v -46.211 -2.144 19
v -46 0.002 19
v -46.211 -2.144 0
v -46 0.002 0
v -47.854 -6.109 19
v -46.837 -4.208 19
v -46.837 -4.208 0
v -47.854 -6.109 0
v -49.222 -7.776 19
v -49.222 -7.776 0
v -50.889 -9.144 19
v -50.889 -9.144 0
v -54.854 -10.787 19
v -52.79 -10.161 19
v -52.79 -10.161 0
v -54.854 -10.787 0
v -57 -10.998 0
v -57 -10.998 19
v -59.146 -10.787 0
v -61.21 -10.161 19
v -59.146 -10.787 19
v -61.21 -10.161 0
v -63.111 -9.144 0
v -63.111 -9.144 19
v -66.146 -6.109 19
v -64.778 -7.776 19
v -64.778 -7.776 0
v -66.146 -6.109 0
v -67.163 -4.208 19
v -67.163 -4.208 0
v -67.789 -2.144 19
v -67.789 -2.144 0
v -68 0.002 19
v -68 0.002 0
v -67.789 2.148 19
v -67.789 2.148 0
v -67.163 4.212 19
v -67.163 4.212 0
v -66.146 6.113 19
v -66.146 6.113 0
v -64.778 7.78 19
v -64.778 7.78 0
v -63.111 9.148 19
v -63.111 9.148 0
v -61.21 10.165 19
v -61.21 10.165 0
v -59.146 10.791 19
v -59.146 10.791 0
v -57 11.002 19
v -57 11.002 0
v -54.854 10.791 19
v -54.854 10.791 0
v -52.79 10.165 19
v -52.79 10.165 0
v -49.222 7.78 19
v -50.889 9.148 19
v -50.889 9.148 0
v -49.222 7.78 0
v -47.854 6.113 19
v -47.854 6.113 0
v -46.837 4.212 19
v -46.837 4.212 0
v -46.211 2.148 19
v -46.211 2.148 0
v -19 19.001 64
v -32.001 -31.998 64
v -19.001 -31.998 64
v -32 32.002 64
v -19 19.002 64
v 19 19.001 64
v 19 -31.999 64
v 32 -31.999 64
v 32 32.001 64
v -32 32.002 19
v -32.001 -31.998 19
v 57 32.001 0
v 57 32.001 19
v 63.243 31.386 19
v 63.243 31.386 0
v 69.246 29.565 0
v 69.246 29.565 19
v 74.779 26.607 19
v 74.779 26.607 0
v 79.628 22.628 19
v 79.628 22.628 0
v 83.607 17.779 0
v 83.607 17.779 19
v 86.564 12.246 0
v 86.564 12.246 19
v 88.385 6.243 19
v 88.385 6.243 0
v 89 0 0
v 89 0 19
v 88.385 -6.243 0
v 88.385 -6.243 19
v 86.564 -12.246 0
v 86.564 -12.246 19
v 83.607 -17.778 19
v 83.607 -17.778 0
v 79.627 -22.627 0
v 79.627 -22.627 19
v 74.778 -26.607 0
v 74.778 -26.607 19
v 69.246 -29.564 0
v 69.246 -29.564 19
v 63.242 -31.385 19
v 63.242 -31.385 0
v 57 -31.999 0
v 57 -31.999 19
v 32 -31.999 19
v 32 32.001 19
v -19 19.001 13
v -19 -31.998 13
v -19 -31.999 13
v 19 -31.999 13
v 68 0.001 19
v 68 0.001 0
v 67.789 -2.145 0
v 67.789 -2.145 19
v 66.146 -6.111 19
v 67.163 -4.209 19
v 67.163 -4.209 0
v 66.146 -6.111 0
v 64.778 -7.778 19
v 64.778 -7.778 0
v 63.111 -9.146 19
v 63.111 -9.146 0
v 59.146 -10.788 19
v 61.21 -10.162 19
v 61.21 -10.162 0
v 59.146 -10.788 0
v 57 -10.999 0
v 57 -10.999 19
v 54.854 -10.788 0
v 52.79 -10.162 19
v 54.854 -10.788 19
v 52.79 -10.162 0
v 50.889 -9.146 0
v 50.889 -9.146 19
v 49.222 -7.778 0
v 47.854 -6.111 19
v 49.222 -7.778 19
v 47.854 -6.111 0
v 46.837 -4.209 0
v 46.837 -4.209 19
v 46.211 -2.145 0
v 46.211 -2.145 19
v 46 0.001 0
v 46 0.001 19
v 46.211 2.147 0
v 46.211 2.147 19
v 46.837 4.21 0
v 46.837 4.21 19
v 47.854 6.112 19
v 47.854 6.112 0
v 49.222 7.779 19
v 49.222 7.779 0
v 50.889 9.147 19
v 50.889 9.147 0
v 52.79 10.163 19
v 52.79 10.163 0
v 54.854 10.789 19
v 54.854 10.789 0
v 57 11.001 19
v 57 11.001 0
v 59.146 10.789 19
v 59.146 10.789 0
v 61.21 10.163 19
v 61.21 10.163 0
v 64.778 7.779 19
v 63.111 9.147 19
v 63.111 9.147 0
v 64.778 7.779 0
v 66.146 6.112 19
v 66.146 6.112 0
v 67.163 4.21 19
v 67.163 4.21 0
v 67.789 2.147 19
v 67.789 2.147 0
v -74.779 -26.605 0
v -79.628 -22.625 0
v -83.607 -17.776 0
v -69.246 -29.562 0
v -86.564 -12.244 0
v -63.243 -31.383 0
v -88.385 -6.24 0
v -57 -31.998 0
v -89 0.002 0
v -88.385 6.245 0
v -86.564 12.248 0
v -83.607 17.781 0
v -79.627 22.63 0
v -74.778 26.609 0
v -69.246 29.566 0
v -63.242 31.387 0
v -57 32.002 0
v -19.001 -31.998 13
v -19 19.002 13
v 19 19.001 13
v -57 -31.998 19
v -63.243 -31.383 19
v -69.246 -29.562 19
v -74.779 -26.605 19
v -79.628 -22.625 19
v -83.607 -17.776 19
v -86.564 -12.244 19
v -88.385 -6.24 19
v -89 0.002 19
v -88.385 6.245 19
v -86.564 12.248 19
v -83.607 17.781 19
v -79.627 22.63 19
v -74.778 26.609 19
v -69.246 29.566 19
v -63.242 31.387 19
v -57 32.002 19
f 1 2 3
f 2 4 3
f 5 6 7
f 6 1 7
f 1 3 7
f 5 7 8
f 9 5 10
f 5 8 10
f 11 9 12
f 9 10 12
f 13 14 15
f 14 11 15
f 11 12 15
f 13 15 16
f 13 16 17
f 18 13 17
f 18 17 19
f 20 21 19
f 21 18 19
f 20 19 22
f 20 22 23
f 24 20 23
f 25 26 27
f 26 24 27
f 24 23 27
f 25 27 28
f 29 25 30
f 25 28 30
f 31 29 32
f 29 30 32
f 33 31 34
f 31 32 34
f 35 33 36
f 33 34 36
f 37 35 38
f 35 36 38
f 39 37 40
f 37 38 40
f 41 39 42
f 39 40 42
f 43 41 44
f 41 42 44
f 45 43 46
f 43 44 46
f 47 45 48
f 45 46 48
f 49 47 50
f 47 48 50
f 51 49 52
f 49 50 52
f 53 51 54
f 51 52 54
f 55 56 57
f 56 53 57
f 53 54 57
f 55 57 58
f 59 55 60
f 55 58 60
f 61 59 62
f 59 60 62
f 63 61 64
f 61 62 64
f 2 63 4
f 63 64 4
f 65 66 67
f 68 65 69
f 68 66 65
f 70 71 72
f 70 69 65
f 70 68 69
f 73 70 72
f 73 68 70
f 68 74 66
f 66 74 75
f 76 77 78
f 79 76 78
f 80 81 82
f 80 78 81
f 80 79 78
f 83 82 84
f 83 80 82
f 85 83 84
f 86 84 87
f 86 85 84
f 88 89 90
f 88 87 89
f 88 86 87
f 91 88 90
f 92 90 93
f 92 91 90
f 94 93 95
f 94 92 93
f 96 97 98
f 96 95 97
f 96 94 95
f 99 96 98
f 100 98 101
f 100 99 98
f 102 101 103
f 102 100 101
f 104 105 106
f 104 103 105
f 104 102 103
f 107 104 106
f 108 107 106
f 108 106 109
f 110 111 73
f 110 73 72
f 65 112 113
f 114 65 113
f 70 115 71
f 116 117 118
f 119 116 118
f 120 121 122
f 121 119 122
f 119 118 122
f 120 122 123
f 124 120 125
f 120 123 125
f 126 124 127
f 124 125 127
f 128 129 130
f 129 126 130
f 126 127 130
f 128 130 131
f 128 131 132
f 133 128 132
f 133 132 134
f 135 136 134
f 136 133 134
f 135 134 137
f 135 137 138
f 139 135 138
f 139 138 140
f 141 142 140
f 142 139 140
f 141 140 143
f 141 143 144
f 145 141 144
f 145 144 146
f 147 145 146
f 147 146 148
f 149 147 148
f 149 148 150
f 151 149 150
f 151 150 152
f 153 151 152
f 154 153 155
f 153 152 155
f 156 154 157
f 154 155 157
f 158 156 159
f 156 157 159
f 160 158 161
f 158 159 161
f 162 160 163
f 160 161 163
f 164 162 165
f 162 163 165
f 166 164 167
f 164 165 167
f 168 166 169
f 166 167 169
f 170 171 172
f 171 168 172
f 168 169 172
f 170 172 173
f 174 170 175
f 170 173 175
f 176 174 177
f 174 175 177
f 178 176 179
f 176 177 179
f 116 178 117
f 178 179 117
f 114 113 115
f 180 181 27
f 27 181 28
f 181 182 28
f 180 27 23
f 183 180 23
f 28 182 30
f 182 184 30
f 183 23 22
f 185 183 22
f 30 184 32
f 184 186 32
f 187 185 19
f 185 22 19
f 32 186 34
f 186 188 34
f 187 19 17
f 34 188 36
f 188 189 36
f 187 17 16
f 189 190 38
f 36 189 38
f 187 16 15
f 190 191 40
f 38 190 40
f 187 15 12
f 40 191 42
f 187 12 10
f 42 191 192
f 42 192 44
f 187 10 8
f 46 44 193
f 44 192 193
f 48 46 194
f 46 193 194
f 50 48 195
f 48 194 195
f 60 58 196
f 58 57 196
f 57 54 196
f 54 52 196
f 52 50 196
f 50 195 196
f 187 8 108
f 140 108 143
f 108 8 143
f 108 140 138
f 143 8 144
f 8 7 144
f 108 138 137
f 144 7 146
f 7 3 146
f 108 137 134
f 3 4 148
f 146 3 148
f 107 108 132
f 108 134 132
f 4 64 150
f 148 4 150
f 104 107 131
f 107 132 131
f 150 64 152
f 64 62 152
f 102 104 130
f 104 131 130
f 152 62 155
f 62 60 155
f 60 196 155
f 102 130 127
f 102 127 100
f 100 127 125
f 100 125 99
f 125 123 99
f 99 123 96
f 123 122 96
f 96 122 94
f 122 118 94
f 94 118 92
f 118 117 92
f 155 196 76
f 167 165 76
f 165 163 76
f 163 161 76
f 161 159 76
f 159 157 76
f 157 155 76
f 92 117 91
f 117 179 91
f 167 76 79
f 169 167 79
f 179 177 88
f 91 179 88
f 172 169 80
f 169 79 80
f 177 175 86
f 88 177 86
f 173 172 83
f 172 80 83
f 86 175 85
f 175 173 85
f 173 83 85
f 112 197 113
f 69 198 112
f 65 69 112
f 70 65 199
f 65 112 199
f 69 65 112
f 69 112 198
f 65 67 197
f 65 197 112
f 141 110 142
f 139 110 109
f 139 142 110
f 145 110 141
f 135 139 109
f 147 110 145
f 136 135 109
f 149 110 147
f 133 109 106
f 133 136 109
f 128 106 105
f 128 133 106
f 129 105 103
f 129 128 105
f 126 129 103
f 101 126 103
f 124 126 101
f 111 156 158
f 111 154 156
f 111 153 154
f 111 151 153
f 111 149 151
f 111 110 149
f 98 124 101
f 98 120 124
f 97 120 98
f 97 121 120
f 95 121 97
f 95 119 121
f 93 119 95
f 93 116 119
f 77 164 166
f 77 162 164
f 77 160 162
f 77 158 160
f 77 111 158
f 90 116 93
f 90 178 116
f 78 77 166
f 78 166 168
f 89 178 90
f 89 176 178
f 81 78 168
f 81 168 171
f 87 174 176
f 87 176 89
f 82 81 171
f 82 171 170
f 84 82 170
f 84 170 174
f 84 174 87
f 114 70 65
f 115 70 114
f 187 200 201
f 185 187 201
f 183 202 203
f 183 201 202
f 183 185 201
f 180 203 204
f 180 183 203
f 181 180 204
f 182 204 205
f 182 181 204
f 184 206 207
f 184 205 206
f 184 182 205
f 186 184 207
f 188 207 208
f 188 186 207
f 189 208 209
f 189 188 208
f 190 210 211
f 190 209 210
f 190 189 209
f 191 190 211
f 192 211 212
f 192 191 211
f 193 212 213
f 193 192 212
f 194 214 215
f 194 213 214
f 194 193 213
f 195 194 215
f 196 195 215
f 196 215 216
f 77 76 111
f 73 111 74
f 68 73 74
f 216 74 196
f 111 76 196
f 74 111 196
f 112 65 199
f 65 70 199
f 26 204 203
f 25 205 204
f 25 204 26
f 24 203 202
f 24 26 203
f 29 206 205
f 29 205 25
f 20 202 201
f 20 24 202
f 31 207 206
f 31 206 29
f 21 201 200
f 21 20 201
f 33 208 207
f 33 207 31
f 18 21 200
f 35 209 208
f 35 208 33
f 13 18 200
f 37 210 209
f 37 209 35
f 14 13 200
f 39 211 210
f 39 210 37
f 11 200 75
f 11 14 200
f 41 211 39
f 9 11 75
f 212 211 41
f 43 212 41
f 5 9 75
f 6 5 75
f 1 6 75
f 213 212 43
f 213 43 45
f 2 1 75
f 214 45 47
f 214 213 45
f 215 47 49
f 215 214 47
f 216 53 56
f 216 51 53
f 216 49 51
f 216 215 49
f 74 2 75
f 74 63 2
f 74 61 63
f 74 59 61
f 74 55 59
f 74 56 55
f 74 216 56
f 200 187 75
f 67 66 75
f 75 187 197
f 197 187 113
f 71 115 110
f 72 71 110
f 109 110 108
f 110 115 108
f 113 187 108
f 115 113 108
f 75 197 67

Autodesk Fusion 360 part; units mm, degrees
sketch "Sketch1" plane through (0, 0, 0) normal (0, 0, 1) x (1, 0, 0)
  circle A0 centre (-57, 0.002) radius 11
  circle A1 centre (57, 0.0006) radius 11
  line L0 (57.0004, 32.0006) -> (-56.9996, 32.002)
  line L1 (-57.0004, -31.998) -> (56.9996, -31.9994)
  line L2 (-32, 32.0017) -> (-32.0007, -31.9983)
  line L3 (32.0004, 32.0009) -> (31.9996, -31.9991)
  line L4 (-19.0007, -31.9985) -> (-19.0002, 19.0015)
  line L5 (18.9996, -31.9989) -> (19.0002, 19.0011)
  line L6 (-19.0004, 19.0015) -> (19.0002, 19.0011)
  arc A2 (-56.9996, 32.002) -> (-57.0004, -31.998) centre (-57, 0.002) ccw
  arc A3 (56.9996, -31.9994) -> (57.0004, 32.0006) centre (57, 0.0006) ccw
  dimension "d1" = 22
  dimension "d2" = 57
  dimension "d3" = 22
  dimension "d4" = 57
  dimension "d7" = 114
  dimension "d8" = 64
  dimension "d9" = 32
  dimension "d10" = 32
  dimension "d13" = 51
extrude "Extrude2" add sketch "Sketch1" along normal blind 19 contours L0 L1 L3 A3 makes body 1
extrude "Extrude1" add sketch "Sketch1" along normal blind 19 separate body contours L0 L1 L2 A2 makes body 2
extrude "Extrude3" add sketch "Sketch1" along normal blind 13 separate body contours L1 L4 L5 L6 makes body 3
extrude "Extrude4" add sketch "Sketch1" along normal blind 64 contours L0 L1 L2 L3 L4 L5 L6 bodies 1 2 3
sketch "Sketch3" plane through (19, -0.0002, 0) normal (-1, 0, 0) x (0, -1, 0)
  line L0 (-19.0013, 13) -> (31.9987, 13)
  line L1 (31.9987, 13) -> (31.9987, 64)
  line L2 (31.9987, 64) -> (-19.0013, 64)
  line L3 (-19.0013, 64) -> (-19.0013, 13)
  line L4 (-19.0013, 64) -> (31.9987, 13)
  line L5 (-19.0013, 64) -> (-19.0013, 13)
  line L6 (31.9987, 13) -> (-19.0013, 13)
extrude "Extrude5" add sketch "Sketch3" along normal blind 38 contours L0 L3 L4 L5 L6 bodies 1
